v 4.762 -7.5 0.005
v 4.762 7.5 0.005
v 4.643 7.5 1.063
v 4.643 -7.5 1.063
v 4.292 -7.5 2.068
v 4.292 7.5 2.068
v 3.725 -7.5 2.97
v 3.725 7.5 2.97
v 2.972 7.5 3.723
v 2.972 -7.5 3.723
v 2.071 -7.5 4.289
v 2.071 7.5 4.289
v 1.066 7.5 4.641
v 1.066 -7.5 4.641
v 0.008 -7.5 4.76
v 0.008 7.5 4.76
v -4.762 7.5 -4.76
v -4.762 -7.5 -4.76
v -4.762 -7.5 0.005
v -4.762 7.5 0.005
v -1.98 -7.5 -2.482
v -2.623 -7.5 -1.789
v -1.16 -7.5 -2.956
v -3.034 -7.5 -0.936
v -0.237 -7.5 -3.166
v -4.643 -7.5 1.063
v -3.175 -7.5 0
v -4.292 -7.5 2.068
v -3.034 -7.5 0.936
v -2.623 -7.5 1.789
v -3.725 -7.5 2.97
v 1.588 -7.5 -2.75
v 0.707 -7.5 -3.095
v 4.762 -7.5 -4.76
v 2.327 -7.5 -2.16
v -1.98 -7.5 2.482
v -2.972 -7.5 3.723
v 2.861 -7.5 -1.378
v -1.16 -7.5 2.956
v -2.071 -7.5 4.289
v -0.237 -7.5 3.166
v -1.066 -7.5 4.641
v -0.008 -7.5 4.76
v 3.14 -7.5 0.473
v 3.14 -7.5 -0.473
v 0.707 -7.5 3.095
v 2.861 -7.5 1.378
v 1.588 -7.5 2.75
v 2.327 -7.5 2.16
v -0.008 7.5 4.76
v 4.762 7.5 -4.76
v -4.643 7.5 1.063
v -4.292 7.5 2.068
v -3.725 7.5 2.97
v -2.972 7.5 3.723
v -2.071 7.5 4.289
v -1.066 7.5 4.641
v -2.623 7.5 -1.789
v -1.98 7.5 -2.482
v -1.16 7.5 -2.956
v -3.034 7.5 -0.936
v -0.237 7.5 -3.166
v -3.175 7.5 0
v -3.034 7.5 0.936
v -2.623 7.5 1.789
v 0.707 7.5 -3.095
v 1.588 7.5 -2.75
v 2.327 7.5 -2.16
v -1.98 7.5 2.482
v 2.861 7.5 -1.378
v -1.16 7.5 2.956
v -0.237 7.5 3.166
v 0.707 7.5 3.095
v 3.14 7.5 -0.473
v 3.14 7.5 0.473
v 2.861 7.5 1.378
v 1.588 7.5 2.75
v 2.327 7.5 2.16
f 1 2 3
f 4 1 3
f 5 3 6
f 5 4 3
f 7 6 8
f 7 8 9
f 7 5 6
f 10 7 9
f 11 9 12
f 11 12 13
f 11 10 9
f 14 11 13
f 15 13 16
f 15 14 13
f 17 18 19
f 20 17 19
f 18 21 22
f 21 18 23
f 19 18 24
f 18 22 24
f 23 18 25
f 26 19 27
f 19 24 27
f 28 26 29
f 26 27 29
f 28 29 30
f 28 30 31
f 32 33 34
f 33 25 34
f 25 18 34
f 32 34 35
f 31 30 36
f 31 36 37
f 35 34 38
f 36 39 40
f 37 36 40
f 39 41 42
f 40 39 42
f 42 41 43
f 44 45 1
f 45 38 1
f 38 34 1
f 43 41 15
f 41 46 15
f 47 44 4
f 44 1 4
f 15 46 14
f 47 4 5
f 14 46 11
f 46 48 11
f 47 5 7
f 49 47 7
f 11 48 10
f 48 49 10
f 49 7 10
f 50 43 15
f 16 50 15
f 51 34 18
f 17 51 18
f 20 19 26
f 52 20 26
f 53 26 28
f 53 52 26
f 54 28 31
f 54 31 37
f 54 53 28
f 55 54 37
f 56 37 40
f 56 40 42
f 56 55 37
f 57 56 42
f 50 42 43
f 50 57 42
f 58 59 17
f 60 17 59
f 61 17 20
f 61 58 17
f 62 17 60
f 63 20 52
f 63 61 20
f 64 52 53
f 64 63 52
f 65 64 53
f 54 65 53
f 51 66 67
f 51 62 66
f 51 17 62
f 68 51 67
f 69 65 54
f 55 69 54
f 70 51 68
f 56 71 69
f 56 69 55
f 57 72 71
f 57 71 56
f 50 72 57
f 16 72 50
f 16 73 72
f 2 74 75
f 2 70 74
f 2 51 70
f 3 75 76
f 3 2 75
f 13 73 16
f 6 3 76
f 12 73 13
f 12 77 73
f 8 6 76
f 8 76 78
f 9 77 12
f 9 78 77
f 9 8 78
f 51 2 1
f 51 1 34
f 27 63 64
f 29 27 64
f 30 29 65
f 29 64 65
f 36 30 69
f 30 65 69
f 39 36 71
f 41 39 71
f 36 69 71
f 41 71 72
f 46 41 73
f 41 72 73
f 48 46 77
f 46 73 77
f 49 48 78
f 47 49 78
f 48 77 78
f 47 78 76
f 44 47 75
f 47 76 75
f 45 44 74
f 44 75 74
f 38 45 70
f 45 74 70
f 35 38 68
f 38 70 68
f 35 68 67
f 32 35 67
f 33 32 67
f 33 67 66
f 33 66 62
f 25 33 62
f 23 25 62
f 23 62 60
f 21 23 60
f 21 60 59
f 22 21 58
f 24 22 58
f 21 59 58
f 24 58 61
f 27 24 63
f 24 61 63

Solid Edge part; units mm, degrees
sketch "Sketch1" plane through (0, 0, 0) normal (0, 1, 0) x (-1, 0, 0)
  line L0 (-4.7625, -4.76) -> (4.7625, -4.76)
  line L1 (4.7625, -4.76) -> (4.7625, 4.76)
  line L2 (4.7625, 4.76) -> (-4.7625, 4.76)
  line L3 (-4.7625, 4.76) -> (-4.7625, -4.76)
extrude "Protrusion1" add sketch "Sketch1" along normal mid plane 15
sketch "Sketch2" plane through (0, 7.5, 0) normal (0, 1, 0) x (-1, 0, 0)
  circle A0 centre (0, 0) radius 3.175
extrude "Cutout1" cut sketch "Sketch2" against normal up to surface (15 mm away)
fillet "Round_1" radius 4.755 2 edges at (-4.7625, 0, 4.76) (4.7625, 0, 4.76)
